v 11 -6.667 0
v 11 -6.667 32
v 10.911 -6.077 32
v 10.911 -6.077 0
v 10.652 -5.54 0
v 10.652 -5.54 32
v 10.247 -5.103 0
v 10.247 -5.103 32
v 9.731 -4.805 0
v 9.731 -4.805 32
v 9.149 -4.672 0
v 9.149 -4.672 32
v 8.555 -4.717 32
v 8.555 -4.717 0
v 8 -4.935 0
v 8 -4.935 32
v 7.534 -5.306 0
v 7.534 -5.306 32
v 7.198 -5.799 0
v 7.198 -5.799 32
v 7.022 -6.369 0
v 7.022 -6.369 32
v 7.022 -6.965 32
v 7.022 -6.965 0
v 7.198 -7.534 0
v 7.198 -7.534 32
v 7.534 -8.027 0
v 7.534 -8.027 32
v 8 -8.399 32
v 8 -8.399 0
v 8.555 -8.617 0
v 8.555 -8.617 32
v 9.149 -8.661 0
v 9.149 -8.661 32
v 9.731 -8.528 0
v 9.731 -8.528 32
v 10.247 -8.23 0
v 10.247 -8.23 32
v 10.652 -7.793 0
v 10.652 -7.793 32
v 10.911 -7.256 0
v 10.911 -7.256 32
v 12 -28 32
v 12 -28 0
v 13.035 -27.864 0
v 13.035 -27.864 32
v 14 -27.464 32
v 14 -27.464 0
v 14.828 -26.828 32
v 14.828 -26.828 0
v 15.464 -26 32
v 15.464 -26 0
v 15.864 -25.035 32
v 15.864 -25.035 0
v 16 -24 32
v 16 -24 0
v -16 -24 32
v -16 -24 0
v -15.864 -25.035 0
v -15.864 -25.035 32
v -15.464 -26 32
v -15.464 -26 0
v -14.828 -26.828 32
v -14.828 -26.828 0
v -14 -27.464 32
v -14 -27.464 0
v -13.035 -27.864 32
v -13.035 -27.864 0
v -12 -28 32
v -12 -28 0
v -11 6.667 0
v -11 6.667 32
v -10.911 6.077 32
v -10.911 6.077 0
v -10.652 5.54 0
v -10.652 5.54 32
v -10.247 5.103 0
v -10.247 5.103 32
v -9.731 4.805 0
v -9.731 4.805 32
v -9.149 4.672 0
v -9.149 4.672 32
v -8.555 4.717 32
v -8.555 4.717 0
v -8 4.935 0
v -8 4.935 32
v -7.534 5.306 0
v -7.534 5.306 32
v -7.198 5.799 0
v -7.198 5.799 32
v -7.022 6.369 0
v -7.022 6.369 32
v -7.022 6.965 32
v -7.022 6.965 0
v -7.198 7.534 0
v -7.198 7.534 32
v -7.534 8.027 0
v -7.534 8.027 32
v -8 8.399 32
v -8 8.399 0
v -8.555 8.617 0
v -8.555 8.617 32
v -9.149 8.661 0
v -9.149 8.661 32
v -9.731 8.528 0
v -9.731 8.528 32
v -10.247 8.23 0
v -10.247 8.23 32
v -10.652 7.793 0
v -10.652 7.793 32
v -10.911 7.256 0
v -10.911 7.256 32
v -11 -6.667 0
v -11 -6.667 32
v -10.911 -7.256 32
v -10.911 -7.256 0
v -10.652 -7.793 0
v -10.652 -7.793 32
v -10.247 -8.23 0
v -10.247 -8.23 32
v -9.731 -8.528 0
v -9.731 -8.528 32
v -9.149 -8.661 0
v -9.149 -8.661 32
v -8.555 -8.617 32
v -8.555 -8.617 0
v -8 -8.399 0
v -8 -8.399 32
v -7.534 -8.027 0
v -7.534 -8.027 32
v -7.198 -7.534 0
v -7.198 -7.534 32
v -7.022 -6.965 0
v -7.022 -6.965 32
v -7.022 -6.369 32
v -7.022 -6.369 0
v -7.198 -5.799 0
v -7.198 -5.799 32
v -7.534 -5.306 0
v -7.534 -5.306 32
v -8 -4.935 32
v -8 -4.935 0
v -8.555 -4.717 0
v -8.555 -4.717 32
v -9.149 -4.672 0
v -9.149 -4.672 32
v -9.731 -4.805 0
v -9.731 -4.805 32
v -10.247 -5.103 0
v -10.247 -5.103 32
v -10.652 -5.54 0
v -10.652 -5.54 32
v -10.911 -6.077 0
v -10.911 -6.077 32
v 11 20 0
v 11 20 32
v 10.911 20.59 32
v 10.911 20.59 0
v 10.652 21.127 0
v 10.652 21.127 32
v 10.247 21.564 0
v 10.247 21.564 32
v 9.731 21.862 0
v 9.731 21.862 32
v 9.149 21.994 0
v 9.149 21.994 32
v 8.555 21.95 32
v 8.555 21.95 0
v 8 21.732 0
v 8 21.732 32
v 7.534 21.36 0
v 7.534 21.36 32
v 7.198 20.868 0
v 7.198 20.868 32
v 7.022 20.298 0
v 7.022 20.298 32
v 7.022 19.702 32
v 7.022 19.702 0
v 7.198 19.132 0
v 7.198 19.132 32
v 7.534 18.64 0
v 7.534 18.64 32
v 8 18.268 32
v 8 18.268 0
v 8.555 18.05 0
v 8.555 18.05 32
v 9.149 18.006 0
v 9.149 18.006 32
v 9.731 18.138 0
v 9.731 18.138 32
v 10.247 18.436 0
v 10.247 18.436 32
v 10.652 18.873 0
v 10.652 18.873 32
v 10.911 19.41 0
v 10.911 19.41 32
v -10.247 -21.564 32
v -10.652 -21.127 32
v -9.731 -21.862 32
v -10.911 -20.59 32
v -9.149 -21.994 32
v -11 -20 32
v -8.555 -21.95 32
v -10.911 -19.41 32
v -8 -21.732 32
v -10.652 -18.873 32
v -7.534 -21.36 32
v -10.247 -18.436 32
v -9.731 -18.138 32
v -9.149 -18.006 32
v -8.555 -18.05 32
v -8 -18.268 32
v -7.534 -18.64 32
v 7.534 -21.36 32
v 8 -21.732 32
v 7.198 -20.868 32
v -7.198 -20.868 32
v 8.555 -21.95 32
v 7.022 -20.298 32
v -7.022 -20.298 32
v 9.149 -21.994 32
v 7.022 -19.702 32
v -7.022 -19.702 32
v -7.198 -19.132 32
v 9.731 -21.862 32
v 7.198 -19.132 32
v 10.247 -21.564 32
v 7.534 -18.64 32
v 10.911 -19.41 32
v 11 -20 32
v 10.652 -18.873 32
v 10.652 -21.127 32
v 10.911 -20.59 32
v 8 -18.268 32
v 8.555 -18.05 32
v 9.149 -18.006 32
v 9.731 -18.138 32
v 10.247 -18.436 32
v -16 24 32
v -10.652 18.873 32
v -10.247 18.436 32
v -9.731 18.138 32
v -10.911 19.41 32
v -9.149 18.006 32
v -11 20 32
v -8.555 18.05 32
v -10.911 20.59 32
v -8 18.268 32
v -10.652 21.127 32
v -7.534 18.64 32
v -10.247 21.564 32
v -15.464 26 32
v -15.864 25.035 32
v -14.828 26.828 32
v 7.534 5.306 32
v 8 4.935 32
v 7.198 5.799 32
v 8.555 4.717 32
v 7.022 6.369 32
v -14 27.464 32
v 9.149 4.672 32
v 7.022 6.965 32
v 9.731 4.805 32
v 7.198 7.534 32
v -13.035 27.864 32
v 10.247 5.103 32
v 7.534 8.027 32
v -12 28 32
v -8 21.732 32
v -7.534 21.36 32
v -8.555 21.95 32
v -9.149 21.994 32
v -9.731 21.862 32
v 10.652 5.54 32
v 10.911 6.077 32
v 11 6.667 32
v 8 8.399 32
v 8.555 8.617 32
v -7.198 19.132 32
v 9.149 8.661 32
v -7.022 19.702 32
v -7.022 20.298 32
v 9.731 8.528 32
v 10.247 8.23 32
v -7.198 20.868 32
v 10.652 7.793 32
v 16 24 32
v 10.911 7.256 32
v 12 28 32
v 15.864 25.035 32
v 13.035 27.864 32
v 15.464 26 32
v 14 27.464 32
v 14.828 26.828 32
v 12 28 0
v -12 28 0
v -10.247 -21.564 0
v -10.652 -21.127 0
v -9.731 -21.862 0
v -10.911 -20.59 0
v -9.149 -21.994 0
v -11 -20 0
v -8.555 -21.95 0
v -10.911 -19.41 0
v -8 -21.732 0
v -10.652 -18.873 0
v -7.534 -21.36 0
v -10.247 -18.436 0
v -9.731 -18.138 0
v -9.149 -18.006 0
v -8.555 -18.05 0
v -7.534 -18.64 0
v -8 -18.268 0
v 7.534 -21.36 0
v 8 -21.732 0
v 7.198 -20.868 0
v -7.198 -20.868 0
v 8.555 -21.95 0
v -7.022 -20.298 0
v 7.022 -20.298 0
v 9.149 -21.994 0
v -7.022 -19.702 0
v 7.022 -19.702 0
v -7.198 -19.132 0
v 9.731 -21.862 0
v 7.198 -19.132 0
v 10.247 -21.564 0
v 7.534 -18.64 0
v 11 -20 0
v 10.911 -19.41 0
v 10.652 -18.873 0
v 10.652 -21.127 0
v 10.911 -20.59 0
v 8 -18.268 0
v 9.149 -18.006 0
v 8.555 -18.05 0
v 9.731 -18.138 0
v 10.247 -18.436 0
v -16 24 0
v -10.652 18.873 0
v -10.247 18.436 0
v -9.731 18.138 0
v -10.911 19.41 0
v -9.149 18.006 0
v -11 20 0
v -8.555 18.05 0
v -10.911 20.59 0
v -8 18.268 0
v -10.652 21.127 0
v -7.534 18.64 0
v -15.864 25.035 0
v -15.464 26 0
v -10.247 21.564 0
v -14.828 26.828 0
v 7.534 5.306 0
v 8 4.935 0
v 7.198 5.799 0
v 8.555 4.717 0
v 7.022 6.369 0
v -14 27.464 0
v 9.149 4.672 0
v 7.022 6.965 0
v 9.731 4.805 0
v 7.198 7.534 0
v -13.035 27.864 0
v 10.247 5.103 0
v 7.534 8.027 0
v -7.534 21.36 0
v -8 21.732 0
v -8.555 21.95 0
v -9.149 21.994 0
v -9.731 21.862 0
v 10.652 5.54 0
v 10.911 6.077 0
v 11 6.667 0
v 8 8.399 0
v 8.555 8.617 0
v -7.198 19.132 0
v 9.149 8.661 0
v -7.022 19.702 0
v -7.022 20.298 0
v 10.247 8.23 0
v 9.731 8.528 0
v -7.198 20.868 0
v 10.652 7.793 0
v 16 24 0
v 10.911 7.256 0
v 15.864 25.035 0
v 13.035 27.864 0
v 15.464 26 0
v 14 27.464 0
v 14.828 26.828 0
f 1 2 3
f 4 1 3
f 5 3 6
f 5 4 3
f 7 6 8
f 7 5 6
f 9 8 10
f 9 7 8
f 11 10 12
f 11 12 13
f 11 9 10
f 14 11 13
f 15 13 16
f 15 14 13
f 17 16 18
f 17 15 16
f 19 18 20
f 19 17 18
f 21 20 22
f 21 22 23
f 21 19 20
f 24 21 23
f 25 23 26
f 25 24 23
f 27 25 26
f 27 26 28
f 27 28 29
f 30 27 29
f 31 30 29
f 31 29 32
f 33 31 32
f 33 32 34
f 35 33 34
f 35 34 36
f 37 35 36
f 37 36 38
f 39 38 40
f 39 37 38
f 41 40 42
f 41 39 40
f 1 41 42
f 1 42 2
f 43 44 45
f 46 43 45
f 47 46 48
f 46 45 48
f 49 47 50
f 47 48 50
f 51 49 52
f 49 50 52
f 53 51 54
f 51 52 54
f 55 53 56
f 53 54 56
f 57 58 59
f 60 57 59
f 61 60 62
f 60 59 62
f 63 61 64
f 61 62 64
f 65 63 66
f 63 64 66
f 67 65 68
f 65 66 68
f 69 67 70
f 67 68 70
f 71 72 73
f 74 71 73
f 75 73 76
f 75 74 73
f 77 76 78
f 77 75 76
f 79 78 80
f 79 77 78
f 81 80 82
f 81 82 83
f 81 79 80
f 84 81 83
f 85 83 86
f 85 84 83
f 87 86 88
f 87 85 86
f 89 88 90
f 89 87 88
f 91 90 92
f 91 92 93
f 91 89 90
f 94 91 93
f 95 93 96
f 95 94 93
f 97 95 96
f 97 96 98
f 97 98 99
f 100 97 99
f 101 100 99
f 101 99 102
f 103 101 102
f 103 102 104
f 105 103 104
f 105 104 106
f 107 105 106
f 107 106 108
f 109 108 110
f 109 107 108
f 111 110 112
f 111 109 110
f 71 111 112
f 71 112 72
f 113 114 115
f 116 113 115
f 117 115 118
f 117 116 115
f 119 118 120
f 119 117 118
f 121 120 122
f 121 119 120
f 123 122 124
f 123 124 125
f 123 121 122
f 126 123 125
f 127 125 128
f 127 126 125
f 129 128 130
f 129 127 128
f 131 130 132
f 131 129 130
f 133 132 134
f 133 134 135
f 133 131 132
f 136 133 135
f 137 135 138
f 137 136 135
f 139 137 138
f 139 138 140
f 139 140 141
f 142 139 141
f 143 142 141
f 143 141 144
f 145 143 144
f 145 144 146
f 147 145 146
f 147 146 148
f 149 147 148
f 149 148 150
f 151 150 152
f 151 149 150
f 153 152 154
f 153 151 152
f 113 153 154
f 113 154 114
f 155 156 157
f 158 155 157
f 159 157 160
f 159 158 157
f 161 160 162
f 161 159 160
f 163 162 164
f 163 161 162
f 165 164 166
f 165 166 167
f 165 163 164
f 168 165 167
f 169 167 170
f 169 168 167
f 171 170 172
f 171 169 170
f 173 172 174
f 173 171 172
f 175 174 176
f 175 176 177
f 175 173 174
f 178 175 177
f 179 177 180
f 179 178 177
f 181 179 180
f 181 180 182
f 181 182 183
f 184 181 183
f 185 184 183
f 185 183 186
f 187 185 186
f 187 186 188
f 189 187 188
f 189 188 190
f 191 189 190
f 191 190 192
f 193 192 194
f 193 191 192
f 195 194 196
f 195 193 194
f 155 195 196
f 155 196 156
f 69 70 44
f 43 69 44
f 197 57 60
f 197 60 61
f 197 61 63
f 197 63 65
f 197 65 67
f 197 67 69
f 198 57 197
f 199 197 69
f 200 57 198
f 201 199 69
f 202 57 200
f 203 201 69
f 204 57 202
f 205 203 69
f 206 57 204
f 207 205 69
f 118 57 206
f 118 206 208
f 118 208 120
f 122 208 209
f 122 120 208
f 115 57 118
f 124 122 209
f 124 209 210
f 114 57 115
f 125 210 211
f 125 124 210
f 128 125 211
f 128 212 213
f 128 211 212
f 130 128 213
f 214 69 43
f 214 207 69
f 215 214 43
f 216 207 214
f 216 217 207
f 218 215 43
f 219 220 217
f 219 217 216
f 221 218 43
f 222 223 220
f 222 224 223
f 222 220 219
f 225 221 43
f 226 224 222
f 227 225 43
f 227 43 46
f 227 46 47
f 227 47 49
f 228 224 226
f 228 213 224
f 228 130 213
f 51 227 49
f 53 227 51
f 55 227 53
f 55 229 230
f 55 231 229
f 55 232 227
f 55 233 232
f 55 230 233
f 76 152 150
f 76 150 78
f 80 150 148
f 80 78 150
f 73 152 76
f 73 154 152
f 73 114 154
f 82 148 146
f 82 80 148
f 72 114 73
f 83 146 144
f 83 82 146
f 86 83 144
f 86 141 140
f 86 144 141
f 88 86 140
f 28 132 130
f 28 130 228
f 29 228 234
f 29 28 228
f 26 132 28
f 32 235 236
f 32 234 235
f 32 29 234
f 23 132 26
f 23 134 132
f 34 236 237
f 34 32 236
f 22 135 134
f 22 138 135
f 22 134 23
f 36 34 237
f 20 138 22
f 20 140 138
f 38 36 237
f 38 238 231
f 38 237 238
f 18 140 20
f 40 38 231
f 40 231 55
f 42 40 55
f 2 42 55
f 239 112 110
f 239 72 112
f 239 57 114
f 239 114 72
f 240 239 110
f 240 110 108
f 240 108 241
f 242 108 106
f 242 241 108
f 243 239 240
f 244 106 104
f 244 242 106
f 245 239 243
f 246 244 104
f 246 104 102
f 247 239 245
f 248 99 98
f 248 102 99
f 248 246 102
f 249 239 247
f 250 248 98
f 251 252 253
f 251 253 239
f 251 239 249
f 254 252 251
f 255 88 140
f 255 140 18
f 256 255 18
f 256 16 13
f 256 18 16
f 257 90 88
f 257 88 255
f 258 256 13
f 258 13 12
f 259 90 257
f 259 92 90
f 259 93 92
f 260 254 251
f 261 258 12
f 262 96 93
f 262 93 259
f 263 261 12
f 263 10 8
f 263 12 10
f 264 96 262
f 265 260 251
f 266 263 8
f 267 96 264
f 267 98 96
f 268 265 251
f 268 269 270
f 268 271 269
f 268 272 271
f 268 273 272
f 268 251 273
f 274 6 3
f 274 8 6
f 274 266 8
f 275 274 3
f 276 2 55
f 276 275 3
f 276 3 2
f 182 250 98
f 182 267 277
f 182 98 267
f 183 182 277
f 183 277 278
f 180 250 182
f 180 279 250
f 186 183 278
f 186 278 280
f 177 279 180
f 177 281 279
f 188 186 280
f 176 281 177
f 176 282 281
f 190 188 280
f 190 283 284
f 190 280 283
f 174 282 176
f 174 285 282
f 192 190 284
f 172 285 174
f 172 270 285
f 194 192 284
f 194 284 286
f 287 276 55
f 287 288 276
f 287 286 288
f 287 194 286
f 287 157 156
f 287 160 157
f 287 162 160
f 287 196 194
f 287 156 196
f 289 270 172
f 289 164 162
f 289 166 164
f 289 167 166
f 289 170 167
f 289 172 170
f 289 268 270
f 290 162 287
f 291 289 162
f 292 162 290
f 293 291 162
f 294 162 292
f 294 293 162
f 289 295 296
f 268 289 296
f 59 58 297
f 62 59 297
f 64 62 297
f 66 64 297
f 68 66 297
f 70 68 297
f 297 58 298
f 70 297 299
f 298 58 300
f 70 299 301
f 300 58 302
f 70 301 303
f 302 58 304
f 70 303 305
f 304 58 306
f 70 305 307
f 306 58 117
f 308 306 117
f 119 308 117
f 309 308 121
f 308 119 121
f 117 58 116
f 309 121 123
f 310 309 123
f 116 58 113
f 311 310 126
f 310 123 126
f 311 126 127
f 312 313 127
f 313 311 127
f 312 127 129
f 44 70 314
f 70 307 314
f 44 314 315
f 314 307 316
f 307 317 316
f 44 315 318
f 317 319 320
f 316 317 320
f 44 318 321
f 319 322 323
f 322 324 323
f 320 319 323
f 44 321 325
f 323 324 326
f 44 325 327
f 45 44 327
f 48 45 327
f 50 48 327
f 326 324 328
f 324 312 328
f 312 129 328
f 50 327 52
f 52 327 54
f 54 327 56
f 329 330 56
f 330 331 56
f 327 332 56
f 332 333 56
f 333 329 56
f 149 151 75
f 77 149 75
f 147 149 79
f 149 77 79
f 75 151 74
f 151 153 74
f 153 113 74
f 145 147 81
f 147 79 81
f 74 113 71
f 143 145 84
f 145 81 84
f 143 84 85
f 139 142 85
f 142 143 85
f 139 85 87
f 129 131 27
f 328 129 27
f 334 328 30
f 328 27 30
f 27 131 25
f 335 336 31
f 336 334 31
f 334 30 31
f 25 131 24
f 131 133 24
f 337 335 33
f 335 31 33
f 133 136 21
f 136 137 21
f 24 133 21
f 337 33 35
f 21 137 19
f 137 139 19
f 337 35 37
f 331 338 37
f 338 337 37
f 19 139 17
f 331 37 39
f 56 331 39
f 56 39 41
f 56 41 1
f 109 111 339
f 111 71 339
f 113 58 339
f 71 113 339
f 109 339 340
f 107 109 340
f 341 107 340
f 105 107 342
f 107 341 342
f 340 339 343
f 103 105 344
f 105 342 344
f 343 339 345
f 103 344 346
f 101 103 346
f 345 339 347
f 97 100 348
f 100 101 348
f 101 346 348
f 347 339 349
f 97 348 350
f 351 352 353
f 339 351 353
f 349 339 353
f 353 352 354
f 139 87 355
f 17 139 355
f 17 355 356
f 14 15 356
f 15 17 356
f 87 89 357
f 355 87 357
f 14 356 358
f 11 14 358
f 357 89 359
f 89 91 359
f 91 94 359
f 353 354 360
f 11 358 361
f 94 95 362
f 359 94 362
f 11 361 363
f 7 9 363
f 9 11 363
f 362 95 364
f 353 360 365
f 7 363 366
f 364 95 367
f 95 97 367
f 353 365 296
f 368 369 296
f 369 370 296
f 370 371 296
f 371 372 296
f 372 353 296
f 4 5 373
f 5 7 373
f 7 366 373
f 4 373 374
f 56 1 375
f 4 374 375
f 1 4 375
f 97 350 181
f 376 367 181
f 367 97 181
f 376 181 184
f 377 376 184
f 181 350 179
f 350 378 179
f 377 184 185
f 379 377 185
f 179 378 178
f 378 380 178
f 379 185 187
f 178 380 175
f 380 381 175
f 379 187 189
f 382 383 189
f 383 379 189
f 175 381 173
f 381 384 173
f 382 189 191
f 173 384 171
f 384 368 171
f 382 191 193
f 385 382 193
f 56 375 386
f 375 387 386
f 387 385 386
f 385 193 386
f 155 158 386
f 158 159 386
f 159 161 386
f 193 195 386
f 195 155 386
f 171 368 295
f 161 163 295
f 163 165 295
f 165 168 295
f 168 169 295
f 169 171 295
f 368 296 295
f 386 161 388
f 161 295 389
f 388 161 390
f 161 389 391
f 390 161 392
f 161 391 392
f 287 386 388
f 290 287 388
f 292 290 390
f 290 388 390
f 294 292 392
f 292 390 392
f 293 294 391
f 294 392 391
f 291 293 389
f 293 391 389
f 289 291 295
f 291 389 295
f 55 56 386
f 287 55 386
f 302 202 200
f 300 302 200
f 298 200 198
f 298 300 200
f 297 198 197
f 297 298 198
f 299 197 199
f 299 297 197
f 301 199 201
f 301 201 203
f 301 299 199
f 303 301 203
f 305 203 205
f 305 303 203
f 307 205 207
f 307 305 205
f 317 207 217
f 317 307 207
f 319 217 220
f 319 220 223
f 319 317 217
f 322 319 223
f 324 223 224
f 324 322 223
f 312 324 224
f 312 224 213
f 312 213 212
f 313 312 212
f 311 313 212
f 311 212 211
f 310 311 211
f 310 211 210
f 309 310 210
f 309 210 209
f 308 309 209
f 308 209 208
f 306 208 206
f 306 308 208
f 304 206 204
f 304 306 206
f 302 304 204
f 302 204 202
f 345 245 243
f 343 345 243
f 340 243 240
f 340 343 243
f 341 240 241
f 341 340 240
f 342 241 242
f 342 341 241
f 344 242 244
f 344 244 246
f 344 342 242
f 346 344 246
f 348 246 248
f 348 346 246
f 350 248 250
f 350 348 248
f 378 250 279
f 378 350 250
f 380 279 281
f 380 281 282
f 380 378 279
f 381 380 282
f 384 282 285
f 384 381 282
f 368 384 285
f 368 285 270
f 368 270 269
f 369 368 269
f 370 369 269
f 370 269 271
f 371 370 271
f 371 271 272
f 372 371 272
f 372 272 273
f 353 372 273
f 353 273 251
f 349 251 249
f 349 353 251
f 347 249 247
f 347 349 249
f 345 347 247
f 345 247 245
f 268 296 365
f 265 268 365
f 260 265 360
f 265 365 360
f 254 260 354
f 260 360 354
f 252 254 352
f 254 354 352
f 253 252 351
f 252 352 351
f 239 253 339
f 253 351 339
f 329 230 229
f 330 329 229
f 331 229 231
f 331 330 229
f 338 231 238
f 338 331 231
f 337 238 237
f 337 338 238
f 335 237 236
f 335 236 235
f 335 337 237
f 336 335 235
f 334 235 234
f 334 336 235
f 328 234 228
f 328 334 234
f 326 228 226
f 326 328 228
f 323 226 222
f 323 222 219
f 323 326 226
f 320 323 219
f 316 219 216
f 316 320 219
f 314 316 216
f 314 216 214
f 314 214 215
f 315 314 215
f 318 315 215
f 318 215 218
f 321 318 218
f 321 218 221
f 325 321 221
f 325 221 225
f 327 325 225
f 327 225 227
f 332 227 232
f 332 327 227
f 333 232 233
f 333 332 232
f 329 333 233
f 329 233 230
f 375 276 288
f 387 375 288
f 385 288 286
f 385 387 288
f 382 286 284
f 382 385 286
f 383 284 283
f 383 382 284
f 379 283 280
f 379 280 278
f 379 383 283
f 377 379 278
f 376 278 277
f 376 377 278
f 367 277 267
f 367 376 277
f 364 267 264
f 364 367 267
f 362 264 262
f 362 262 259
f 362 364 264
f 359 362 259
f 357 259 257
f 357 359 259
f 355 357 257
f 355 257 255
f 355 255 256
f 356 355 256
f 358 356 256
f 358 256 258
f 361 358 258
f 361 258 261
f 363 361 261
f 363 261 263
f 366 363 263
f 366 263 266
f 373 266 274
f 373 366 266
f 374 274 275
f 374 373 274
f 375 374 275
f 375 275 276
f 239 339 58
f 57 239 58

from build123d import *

# Parameters (mm, degrees)
SKETCH_1_R      = 2
EXTRUDE_1_DEPTH = 32


with BuildPart() as part:
    # 草图1 → 凸台-拉伸1 (new body)
    with BuildSketch(Plane.XY):
        with BuildLine():
            Line((12, 28), (-12, 28))
            ThreePointArc((-12, 28), (-14.828427125, 26.828427125), (-16, 24))
            Line((-16, 24), (-16, -24))
            ThreePointArc((-16, -24), (-14.828427125, -26.828427125), (-12, -28))
            Line((-12, -28), (12, -28))
            ThreePointArc((12, -28), (14.828427125, -26.828427125), (16, -24))
            Line((16, -24), (16, 24))
            ThreePointArc((16, 24), (14.828427125, 26.828427125), (12, 28))
        make_face()
        with Locations((9, 20)):
            Circle(SKETCH_1_R, mode=Mode.SUBTRACT)
        with Locations((9, 6.666666667)):
            Circle(SKETCH_1_R, mode=Mode.SUBTRACT)
        with Locations((9, -6.666666667)):
            Circle(SKETCH_1_R, mode=Mode.SUBTRACT)
        with Locations((9, -20)):
            Circle(SKETCH_1_R, mode=Mode.SUBTRACT)
        with Locations(Location((-9, -20, 0), (0, 0, 180))):
            Circle(SKETCH_1_R, mode=Mode.SUBTRACT)
        with Locations(Location((-9, -6.666666667, 0), (0, 0, 180))):
            Circle(SKETCH_1_R, mode=Mode.SUBTRACT)
        with Locations(Location((-9, 6.666666667, 0), (0, 0, 180))):
            Circle(SKETCH_1_R, mode=Mode.SUBTRACT)
        with Locations(Location((-9, 20, 0), (0, 0, 180))):
            Circle(SKETCH_1_R, mode=Mode.SUBTRACT)
    extrude(amount=EXTRUDE_1_DEPTH)


solid = part.part
